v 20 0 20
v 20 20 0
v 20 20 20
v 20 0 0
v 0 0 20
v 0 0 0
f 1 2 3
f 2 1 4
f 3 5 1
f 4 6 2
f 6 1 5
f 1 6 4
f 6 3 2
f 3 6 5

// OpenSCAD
triangle();

module triangle(l = 20, w = 20, h = 20) {
	scale([l, w, h]) {
		difference(){
			cube([1, 1, 1]);
			translate([0, 0, -0.5]) rotate([0,0,45]) cube([2, 2, 2]);
		}
	}
}
